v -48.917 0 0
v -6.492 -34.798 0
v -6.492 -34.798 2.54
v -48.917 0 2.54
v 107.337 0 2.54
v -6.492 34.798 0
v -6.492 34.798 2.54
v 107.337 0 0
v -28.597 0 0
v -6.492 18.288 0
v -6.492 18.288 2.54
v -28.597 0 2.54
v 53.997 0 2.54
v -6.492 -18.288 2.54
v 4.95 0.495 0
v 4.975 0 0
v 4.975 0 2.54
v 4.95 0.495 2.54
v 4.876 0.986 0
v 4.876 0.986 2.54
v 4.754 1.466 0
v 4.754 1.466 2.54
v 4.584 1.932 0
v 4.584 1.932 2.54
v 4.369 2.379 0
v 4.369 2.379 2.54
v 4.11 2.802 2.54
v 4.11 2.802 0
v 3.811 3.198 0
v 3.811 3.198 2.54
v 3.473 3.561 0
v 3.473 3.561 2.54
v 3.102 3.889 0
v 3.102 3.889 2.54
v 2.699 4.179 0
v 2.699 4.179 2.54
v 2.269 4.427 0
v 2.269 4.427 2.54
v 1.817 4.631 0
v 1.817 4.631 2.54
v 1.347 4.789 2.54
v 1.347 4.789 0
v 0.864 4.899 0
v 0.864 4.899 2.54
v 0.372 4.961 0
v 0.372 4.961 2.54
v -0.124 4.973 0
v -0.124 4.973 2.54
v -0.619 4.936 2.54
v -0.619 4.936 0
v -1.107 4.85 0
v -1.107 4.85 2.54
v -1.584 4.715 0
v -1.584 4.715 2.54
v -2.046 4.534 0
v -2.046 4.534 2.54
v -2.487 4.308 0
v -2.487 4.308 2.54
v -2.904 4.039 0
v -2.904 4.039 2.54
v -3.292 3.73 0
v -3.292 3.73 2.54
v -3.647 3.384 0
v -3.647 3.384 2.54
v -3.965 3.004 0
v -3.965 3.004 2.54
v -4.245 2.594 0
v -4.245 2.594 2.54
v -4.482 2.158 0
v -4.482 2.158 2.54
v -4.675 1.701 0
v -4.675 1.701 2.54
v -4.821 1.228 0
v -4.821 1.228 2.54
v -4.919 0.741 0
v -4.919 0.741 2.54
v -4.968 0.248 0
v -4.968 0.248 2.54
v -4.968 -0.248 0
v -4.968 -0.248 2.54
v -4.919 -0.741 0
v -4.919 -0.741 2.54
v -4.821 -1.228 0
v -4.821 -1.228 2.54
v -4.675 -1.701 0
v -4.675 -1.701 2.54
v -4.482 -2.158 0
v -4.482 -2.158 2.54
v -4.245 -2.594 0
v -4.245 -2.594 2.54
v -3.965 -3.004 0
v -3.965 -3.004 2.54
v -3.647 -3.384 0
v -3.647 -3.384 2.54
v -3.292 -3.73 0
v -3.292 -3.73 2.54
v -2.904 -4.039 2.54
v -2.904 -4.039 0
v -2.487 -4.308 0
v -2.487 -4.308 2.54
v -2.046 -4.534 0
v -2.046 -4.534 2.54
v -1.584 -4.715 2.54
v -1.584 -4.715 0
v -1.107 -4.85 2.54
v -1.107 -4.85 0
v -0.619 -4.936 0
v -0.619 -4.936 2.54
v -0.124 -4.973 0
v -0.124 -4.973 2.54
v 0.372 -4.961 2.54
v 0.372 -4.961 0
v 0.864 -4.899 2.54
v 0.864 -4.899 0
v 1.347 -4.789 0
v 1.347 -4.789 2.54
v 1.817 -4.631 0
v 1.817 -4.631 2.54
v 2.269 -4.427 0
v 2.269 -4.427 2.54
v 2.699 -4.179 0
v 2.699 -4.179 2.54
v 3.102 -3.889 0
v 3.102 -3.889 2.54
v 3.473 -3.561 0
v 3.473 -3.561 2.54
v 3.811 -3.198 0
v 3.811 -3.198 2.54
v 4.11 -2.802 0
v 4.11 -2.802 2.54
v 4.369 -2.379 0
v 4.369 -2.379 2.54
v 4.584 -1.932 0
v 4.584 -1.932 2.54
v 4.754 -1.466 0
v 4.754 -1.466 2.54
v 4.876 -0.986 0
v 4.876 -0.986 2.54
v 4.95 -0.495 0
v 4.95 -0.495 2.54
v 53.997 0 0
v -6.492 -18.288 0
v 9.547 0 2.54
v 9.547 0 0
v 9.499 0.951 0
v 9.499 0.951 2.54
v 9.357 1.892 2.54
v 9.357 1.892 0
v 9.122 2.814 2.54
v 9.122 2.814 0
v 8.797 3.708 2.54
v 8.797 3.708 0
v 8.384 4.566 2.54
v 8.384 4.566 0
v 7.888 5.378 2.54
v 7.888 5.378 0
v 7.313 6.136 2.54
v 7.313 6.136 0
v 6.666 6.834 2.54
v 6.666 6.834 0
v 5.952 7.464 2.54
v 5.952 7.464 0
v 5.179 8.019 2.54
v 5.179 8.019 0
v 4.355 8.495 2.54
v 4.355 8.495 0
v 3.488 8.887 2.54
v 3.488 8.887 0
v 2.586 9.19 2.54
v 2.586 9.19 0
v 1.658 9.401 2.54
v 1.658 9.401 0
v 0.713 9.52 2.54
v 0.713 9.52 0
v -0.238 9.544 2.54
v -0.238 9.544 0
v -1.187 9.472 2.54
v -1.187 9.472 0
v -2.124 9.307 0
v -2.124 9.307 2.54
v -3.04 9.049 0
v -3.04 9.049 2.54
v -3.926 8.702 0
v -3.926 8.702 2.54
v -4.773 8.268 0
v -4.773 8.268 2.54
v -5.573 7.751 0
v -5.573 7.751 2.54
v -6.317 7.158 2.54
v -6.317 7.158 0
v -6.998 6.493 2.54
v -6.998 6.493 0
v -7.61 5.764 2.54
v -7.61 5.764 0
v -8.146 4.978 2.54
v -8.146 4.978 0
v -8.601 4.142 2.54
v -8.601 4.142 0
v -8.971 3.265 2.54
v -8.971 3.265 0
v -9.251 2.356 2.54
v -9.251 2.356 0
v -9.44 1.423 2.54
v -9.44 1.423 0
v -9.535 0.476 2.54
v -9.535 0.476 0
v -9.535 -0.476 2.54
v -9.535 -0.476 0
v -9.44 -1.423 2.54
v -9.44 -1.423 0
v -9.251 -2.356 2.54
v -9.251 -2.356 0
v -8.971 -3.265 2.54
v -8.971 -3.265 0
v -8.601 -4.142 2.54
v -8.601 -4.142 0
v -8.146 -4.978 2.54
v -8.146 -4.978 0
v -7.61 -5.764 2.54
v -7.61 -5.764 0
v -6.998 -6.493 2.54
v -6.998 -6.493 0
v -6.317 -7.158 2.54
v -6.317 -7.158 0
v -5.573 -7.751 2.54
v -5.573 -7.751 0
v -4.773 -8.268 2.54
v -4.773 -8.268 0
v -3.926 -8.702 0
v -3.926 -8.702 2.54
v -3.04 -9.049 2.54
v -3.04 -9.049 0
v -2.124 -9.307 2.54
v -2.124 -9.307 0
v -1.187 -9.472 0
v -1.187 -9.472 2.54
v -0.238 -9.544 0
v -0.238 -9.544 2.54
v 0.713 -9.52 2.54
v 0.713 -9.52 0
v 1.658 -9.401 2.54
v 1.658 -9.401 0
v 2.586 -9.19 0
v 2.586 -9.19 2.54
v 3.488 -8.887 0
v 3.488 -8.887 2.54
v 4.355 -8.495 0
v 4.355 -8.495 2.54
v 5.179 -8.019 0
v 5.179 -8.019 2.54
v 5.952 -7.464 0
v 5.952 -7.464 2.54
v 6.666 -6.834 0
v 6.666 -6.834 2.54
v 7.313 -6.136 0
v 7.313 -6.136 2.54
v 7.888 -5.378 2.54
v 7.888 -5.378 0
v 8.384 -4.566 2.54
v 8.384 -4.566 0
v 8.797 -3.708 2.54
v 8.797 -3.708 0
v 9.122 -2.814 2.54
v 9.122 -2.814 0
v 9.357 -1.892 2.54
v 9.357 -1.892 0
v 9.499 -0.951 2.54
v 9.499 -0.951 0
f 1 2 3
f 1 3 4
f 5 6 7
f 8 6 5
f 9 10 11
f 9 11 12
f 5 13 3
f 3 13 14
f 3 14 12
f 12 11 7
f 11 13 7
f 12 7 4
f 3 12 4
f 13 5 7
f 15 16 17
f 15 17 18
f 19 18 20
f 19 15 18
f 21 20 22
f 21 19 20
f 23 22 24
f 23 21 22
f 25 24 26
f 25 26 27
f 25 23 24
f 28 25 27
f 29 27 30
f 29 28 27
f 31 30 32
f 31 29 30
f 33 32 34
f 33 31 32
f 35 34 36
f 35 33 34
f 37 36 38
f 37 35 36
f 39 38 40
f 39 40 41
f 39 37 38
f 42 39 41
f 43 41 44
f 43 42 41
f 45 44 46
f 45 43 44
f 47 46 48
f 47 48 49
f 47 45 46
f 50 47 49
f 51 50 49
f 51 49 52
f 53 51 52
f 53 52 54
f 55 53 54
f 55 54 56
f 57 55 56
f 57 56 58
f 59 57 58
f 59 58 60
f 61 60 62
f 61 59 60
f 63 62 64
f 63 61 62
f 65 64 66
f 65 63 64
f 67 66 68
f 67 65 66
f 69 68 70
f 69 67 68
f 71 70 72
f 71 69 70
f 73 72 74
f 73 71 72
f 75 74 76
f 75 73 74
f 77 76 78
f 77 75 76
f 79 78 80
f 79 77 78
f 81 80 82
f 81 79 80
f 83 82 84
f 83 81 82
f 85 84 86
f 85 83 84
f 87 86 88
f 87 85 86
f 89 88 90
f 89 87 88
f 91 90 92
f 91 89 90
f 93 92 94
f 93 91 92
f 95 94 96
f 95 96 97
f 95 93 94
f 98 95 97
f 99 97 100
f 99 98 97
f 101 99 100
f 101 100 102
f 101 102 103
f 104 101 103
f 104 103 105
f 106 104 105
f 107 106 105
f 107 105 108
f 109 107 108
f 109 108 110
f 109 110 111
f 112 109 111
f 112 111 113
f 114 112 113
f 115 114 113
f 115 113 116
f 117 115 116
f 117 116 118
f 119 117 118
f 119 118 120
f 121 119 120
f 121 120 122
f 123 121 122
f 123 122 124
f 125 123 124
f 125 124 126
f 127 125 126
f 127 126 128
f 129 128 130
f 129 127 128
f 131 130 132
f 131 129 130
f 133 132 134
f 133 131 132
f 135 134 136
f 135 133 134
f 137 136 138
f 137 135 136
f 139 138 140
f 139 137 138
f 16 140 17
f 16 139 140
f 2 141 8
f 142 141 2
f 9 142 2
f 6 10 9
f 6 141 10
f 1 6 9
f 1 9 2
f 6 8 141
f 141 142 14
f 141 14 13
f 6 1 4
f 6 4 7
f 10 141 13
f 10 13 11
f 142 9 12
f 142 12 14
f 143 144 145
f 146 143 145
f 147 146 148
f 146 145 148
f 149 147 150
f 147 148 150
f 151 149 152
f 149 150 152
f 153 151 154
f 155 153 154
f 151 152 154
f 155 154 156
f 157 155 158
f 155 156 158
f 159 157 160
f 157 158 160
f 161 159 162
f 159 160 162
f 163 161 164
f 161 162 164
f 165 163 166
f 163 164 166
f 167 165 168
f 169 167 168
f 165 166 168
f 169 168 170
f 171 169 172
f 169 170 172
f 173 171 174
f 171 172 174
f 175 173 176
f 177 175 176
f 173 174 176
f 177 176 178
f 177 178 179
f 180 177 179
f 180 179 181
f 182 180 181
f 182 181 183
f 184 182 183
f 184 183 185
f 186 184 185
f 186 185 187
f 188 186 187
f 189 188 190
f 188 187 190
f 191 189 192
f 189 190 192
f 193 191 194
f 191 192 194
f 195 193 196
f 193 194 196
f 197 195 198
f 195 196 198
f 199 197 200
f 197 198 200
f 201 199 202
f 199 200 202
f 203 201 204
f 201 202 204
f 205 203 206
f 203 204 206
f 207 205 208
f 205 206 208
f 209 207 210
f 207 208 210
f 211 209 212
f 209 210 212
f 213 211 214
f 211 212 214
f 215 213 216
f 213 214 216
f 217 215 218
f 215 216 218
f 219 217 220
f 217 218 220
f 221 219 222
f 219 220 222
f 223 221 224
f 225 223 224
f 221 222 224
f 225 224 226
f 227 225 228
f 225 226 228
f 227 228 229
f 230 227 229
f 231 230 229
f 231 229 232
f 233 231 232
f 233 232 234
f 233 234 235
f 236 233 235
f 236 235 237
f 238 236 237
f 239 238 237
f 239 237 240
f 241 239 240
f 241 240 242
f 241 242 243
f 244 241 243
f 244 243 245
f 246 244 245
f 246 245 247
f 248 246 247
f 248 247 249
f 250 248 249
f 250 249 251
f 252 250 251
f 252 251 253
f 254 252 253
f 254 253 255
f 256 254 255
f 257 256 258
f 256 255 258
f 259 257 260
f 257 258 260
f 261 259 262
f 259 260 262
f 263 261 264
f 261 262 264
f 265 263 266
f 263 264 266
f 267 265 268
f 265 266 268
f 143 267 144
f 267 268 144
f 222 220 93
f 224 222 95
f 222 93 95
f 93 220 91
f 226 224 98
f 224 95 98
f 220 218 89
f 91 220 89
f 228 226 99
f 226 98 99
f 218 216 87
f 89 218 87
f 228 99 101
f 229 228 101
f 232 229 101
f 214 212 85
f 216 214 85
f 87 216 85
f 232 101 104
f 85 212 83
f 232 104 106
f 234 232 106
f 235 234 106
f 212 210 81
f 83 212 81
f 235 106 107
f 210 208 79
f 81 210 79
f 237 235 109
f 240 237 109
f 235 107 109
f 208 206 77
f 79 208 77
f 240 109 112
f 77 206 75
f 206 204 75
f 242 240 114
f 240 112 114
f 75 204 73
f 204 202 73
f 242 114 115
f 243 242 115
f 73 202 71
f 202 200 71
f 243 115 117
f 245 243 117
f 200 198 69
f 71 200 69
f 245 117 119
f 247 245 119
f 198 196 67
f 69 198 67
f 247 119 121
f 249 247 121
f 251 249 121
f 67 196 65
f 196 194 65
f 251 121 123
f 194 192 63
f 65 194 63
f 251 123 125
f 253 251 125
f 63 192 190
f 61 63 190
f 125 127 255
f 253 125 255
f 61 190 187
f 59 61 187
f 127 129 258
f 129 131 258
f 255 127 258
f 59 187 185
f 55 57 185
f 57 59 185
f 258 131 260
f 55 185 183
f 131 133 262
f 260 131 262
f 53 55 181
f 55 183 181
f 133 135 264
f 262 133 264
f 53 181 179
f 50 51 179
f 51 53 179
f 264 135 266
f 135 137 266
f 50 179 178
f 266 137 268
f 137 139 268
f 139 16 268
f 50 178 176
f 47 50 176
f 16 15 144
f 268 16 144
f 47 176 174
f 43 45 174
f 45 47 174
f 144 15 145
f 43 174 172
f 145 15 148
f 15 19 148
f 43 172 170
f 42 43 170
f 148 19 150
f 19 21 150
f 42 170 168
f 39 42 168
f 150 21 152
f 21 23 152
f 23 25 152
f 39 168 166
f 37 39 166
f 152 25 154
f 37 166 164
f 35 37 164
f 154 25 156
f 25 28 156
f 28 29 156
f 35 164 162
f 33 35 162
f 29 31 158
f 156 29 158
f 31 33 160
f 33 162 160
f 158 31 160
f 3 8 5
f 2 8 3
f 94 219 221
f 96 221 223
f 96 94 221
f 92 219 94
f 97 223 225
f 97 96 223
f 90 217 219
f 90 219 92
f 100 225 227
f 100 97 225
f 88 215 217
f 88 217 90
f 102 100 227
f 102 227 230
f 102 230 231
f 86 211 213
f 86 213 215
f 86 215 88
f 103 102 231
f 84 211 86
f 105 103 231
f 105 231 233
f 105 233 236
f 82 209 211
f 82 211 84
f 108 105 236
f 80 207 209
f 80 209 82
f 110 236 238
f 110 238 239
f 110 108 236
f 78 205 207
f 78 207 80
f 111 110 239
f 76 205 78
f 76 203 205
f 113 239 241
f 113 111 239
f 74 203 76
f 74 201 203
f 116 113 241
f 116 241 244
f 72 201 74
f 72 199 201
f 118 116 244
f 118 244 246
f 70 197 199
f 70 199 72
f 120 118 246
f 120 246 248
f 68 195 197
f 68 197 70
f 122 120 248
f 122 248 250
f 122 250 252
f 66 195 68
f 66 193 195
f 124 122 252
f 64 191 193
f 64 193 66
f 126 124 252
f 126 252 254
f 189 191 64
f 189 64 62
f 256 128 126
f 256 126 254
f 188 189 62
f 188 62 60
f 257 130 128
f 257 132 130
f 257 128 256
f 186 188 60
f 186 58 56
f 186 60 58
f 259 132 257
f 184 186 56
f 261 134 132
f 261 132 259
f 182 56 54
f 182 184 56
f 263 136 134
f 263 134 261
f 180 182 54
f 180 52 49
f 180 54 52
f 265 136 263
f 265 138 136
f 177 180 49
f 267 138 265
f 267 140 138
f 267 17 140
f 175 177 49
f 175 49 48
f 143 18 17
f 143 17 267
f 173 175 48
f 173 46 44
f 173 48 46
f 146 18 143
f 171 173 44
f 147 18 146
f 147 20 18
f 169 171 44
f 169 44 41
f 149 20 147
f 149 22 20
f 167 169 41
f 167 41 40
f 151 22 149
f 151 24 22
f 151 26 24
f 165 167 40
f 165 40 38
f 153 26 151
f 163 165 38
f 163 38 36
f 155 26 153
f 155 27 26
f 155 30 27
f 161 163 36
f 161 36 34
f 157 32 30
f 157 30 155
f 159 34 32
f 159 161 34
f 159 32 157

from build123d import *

# Parameters (mm, degrees)
BOSS_EXTRUDE1_DEPTH   = 2.54
SKETCH1_R             = 9.546523702
SKETCH1_R_2           = 4.974523702
BOSS_EXTRUDE1_2_DEPTH = 2.54


with BuildPart() as part:
    # Sketch1 → Boss-Extrude1 (new body)
    with BuildSketch(Plane.XY):
        Polygon((-48.916523702, 0), (-6.491780802, 34.798), (107.336523702, 0), (-6.491780802, -34.798), align=None)
        Polygon((-28.596523702, 0), (-6.491780802, -18.288), (53.996523702, 0), (-6.491780802, 18.288), align=None, mode=Mode.SUBTRACT)
    extrude(amount=BOSS_EXTRUDE1_DEPTH)


with BuildPart() as body_2:
    # Sketch1 → Boss-Extrude1 2 (new body)
    with BuildSketch(Plane.XY):
        Circle(SKETCH1_R)
        Circle(SKETCH1_R_2, mode=Mode.SUBTRACT)
    extrude(amount=BOSS_EXTRUDE1_2_DEPTH)


solid = Compound([part.part, body_2.part])
